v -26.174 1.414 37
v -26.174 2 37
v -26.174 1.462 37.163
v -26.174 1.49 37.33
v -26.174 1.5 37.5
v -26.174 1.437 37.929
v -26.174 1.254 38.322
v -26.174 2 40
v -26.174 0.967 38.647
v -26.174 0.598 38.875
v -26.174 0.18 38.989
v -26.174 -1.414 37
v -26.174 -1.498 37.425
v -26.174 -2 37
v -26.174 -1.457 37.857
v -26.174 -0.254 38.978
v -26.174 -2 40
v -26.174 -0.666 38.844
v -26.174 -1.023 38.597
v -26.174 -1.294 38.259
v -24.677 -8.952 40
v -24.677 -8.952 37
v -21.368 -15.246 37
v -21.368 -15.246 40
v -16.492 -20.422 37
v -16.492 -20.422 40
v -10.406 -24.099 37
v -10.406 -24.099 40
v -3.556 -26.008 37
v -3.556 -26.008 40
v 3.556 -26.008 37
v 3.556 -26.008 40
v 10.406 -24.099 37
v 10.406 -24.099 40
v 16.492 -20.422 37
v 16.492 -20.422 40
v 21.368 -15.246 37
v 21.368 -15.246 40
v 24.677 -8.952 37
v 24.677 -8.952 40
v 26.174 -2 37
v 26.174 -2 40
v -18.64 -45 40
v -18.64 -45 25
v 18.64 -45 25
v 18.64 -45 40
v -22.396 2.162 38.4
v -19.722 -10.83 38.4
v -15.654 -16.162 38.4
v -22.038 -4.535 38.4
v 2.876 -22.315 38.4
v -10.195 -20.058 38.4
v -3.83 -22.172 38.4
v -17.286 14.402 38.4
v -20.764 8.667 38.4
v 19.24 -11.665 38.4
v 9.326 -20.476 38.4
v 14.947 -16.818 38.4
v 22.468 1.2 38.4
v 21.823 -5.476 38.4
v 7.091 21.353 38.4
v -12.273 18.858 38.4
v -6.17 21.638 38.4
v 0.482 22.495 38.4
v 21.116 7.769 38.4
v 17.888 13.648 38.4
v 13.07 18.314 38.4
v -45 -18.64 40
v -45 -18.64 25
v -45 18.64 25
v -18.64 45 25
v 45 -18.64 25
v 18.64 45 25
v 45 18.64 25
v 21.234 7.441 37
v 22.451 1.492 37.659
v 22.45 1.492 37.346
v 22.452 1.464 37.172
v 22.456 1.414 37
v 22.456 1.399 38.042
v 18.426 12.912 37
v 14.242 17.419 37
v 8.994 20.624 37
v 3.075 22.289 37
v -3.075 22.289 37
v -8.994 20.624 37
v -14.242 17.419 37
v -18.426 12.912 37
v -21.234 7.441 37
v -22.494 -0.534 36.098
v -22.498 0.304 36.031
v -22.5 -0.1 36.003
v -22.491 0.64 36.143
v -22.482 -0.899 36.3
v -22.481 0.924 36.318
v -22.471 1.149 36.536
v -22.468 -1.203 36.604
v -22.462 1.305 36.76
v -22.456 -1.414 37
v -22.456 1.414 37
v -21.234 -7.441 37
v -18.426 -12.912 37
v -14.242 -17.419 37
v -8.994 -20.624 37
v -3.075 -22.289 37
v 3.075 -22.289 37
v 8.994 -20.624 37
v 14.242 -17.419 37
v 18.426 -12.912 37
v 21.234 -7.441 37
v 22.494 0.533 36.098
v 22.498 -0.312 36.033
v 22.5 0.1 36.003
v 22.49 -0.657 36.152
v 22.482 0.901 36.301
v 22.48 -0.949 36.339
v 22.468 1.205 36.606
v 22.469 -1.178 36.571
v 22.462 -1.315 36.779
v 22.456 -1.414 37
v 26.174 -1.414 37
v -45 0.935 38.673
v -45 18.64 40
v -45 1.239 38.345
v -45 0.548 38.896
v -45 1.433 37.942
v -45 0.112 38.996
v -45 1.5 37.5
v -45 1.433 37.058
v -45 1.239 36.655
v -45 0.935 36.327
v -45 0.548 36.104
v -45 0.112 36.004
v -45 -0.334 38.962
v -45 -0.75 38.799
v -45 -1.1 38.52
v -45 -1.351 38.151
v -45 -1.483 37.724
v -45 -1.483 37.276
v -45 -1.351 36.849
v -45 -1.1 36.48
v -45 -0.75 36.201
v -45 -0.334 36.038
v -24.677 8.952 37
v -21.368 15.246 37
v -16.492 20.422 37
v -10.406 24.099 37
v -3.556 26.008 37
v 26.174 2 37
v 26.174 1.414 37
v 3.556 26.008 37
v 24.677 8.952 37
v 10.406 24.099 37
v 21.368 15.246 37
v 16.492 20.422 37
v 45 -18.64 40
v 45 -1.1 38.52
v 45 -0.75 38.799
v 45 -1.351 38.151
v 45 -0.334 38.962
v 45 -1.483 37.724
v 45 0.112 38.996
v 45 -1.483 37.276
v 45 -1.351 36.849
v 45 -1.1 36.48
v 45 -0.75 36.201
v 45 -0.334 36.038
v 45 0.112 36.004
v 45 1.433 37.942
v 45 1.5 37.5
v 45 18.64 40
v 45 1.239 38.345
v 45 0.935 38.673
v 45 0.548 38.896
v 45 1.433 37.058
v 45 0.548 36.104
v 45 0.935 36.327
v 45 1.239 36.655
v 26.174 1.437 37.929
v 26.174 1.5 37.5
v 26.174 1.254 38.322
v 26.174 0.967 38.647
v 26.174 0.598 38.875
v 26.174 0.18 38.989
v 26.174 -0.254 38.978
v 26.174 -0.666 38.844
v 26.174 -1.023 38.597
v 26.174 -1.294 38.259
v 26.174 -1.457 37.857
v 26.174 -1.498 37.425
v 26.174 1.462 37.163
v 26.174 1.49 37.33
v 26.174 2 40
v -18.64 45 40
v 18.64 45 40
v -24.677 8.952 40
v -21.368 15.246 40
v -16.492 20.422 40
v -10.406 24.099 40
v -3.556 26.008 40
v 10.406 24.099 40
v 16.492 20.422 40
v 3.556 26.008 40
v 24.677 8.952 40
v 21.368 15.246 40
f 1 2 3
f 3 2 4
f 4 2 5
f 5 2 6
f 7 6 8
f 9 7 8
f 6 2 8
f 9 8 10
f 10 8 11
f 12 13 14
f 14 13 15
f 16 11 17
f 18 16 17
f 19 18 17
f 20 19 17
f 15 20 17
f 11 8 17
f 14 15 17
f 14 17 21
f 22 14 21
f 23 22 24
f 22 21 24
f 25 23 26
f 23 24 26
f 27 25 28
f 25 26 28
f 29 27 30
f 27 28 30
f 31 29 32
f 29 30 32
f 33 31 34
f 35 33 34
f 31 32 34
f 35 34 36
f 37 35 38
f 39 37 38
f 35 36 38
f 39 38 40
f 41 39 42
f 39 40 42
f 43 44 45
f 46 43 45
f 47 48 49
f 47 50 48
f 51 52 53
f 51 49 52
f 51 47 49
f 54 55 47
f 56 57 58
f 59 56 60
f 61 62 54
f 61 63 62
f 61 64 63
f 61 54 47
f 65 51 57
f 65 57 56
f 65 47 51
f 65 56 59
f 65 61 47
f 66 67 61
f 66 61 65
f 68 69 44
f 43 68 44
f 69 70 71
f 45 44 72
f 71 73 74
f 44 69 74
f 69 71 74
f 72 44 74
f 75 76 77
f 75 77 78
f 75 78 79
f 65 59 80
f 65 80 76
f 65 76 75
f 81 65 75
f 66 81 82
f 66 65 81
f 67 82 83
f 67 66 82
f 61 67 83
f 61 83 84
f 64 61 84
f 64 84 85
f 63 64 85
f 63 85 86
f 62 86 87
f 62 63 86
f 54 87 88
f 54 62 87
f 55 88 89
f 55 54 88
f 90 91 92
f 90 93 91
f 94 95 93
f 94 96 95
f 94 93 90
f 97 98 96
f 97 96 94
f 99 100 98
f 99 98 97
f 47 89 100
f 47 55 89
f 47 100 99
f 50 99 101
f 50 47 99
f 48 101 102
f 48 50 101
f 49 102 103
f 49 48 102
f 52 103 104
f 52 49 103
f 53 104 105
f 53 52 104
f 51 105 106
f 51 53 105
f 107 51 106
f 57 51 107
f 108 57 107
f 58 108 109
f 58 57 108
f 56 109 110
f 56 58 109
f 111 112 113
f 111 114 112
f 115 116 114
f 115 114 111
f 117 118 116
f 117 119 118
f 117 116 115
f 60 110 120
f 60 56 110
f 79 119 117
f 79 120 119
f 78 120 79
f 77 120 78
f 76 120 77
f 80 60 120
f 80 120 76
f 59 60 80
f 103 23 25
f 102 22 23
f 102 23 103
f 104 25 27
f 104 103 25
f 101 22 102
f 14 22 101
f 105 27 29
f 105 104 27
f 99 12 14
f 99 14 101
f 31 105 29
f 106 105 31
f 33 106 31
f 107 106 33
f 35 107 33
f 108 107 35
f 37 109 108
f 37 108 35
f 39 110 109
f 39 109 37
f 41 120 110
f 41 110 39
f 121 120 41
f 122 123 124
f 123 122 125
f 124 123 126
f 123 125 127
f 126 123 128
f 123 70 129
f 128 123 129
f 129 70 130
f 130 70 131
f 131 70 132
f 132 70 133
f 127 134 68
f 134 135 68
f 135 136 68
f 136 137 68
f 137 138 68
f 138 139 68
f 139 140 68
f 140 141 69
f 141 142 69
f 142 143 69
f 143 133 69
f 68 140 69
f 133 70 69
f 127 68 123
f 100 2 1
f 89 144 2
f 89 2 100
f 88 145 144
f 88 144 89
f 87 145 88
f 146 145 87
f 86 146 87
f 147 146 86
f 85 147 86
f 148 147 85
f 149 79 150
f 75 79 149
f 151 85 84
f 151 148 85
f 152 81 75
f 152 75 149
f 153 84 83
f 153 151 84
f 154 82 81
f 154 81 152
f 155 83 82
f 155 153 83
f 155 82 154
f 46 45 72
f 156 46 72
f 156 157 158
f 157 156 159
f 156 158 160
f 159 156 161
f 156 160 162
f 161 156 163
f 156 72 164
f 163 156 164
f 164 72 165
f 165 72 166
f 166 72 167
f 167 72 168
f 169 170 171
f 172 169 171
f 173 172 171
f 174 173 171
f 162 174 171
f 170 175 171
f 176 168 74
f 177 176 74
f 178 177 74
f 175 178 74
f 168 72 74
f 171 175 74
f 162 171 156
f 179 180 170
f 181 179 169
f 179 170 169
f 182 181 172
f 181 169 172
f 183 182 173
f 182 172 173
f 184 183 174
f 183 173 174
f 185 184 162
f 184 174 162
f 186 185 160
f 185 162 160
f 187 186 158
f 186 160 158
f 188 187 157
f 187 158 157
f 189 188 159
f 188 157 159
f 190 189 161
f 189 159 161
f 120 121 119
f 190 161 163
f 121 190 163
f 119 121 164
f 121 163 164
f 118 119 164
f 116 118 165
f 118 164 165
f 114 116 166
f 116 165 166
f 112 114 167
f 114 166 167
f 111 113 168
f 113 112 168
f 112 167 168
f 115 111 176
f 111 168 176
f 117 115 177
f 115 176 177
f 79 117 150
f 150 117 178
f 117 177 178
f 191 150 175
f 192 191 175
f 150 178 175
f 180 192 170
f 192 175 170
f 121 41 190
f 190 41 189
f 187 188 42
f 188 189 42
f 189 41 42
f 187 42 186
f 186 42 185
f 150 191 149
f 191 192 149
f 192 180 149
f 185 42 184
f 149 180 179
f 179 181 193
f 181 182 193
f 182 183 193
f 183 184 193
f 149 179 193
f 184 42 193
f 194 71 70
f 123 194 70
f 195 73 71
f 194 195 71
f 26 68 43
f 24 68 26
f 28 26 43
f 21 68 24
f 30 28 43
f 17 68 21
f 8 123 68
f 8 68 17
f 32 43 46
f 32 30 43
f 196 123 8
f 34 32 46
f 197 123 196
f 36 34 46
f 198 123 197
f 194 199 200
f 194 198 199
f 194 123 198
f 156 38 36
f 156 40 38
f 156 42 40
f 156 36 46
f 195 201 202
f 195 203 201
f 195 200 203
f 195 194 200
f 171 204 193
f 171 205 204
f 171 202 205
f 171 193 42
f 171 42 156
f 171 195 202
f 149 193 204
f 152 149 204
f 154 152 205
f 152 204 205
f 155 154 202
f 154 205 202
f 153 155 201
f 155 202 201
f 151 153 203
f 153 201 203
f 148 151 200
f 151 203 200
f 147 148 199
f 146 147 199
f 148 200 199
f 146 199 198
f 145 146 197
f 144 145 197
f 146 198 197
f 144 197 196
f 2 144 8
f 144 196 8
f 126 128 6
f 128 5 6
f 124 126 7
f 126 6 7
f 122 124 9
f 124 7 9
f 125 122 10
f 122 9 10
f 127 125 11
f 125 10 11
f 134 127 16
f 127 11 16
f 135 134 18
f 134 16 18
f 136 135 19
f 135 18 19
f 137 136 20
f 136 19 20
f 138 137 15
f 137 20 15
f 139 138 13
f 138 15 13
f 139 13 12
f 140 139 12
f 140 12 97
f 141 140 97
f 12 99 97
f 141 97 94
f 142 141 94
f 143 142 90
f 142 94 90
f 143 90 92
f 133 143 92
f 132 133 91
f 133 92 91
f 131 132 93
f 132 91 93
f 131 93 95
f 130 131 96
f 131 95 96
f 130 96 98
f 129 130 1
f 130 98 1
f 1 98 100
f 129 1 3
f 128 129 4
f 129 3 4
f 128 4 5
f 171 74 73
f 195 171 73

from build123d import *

# Parameters (mm, degrees)
F1_DEPTH       = 40
F2_R           = 22.5
F3_DEPTH       = 3
F5_DEPTH       = 25
F6_DEPTH       = 25
F7_DEPTH       = 25
F8_R           = 1.5
F9_DEPTH       = 110
F10_END_RADIUS = 22.5
F10_REACH      = 49.2436407871
F11_END_RADIUS = 22.5
F11_REACH      = 49.2436407871
F12_DEPTH      = 1.6


with BuildPart() as f1:
    # F0 (on Top) → F1 (new body)
    with BuildSketch(Plane.XY):
        Polygon((18.6396103068, 45), (-18.6396103068, 45), (-45, 18.6396103068), (-45, -18.6396103068), (-18.6396103068, -45), (18.6396103068, -45), (45, -18.6396103068), (45, 18.6396103068), align=None)
    extrude(amount=F1_DEPTH)

    # F2 (on face) → F3 (cut)
    with BuildSketch(Plane.XY.offset(40)):
        with BuildLine():
            Line((-26.1736986305, 2), (-26.1736986305, -2))
            ThreePointArc((-26.1736986305, -2), (0, -26.25), (26.1736986305, -2))
            Line((26.1736986305, -2), (26.1736986305, 2))
            ThreePointArc((26.1736986305, 2), (0, 26.25), (-26.1736986305, 2))
        make_face()
        Circle(F2_R, mode=Mode.SUBTRACT)
    extrude(amount=-F3_DEPTH, mode=Mode.SUBTRACT)

    # F4 (on face) → F5 (join)
    with BuildSketch(Plane.XY):
        Polygon((-18.6396103068, -45), (18.6396103068, -45), (45, -18.6396103068), (45, 18.6396103068), (18.6396103068, 45), (-18.6396103068, 45), (-45, 18.6396103068), (-45, -18.6396103068), align=None)
    extrude(amount=F5_DEPTH)

    # F0 (on Top) → F6 (join)
    with BuildSketch(Plane.XY):
        Polygon((18.6396103068, 45), (-18.6396103068, 45), (-45, 18.6396103068), (-45, -18.6396103068), (-18.6396103068, -45), (18.6396103068, -45), (45, -18.6396103068), (45, 18.6396103068), align=None)
    extrude(amount=F6_DEPTH)

    # F0 (on Top) → F7 (cut)
    with BuildSketch(Plane.XY):
        Polygon((18.6396103068, 45), (-18.6396103068, 45), (-45, 18.6396103068), (-45, -18.6396103068), (-18.6396103068, -45), (18.6396103068, -45), (45, -18.6396103068), (45, 18.6396103068), align=None)
    extrude(amount=F7_DEPTH, mode=Mode.SUBTRACT)

    # F8 (on Right) → F9 (cut, symmetric)
    with BuildSketch(Plane.YZ):
        with Locations((0, 37.5)):
            Circle(F8_R)
    extrude(amount=F9_DEPTH, both=True, mode=Mode.SUBTRACT)

    f10_end = (Plane.XY.offset(38.5) * Cylinder(F10_END_RADIUS, 354.8073942381, mode=Mode.PRIVATE)).faces().sort_by_distance((-22.5, 0, 39.3628971796))[0]
    # F8 (on Right) → F10 (join, up to the whole of a round face its end follows)
    with BuildSketch(Plane.YZ):
        with Locations((0, 37.5)):
            Circle(F8_R)
    f10_long = extrude(amount=F10_REACH, mode=Mode.PRIVATE)
    add(split(f10_long, bisect_by=f10_end, keep=Keep.BOTTOM, mode=Mode.PRIVATE))

    f11_end = (Plane.XY.offset(38.5) * Cylinder(F11_END_RADIUS, 354.8073942381, mode=Mode.PRIVATE)).faces().sort_by_distance((-22.5, 0, 39.3628971796))[0]
    # F8 (on Right) → F11 (join, up to the whole of a round face its end follows)
    with BuildSketch(Plane.YZ):
        with Locations((0, 37.5)):
            Circle(F8_R)
    f11_long = extrude(amount=-F11_REACH, mode=Mode.PRIVATE)
    add(split(f11_long, bisect_by=f11_end, keep=Keep.BOTTOM, mode=Mode.PRIVATE))

    # F12 (cut): a face of the model
    f12_faces = [f1.faces().sort_by_distance(p)[0] for p in [
        (0, 0, 40),
    ]]
    extrude(f12_faces, amount=-F12_DEPTH, mode=Mode.SUBTRACT)


solid = f1.part
